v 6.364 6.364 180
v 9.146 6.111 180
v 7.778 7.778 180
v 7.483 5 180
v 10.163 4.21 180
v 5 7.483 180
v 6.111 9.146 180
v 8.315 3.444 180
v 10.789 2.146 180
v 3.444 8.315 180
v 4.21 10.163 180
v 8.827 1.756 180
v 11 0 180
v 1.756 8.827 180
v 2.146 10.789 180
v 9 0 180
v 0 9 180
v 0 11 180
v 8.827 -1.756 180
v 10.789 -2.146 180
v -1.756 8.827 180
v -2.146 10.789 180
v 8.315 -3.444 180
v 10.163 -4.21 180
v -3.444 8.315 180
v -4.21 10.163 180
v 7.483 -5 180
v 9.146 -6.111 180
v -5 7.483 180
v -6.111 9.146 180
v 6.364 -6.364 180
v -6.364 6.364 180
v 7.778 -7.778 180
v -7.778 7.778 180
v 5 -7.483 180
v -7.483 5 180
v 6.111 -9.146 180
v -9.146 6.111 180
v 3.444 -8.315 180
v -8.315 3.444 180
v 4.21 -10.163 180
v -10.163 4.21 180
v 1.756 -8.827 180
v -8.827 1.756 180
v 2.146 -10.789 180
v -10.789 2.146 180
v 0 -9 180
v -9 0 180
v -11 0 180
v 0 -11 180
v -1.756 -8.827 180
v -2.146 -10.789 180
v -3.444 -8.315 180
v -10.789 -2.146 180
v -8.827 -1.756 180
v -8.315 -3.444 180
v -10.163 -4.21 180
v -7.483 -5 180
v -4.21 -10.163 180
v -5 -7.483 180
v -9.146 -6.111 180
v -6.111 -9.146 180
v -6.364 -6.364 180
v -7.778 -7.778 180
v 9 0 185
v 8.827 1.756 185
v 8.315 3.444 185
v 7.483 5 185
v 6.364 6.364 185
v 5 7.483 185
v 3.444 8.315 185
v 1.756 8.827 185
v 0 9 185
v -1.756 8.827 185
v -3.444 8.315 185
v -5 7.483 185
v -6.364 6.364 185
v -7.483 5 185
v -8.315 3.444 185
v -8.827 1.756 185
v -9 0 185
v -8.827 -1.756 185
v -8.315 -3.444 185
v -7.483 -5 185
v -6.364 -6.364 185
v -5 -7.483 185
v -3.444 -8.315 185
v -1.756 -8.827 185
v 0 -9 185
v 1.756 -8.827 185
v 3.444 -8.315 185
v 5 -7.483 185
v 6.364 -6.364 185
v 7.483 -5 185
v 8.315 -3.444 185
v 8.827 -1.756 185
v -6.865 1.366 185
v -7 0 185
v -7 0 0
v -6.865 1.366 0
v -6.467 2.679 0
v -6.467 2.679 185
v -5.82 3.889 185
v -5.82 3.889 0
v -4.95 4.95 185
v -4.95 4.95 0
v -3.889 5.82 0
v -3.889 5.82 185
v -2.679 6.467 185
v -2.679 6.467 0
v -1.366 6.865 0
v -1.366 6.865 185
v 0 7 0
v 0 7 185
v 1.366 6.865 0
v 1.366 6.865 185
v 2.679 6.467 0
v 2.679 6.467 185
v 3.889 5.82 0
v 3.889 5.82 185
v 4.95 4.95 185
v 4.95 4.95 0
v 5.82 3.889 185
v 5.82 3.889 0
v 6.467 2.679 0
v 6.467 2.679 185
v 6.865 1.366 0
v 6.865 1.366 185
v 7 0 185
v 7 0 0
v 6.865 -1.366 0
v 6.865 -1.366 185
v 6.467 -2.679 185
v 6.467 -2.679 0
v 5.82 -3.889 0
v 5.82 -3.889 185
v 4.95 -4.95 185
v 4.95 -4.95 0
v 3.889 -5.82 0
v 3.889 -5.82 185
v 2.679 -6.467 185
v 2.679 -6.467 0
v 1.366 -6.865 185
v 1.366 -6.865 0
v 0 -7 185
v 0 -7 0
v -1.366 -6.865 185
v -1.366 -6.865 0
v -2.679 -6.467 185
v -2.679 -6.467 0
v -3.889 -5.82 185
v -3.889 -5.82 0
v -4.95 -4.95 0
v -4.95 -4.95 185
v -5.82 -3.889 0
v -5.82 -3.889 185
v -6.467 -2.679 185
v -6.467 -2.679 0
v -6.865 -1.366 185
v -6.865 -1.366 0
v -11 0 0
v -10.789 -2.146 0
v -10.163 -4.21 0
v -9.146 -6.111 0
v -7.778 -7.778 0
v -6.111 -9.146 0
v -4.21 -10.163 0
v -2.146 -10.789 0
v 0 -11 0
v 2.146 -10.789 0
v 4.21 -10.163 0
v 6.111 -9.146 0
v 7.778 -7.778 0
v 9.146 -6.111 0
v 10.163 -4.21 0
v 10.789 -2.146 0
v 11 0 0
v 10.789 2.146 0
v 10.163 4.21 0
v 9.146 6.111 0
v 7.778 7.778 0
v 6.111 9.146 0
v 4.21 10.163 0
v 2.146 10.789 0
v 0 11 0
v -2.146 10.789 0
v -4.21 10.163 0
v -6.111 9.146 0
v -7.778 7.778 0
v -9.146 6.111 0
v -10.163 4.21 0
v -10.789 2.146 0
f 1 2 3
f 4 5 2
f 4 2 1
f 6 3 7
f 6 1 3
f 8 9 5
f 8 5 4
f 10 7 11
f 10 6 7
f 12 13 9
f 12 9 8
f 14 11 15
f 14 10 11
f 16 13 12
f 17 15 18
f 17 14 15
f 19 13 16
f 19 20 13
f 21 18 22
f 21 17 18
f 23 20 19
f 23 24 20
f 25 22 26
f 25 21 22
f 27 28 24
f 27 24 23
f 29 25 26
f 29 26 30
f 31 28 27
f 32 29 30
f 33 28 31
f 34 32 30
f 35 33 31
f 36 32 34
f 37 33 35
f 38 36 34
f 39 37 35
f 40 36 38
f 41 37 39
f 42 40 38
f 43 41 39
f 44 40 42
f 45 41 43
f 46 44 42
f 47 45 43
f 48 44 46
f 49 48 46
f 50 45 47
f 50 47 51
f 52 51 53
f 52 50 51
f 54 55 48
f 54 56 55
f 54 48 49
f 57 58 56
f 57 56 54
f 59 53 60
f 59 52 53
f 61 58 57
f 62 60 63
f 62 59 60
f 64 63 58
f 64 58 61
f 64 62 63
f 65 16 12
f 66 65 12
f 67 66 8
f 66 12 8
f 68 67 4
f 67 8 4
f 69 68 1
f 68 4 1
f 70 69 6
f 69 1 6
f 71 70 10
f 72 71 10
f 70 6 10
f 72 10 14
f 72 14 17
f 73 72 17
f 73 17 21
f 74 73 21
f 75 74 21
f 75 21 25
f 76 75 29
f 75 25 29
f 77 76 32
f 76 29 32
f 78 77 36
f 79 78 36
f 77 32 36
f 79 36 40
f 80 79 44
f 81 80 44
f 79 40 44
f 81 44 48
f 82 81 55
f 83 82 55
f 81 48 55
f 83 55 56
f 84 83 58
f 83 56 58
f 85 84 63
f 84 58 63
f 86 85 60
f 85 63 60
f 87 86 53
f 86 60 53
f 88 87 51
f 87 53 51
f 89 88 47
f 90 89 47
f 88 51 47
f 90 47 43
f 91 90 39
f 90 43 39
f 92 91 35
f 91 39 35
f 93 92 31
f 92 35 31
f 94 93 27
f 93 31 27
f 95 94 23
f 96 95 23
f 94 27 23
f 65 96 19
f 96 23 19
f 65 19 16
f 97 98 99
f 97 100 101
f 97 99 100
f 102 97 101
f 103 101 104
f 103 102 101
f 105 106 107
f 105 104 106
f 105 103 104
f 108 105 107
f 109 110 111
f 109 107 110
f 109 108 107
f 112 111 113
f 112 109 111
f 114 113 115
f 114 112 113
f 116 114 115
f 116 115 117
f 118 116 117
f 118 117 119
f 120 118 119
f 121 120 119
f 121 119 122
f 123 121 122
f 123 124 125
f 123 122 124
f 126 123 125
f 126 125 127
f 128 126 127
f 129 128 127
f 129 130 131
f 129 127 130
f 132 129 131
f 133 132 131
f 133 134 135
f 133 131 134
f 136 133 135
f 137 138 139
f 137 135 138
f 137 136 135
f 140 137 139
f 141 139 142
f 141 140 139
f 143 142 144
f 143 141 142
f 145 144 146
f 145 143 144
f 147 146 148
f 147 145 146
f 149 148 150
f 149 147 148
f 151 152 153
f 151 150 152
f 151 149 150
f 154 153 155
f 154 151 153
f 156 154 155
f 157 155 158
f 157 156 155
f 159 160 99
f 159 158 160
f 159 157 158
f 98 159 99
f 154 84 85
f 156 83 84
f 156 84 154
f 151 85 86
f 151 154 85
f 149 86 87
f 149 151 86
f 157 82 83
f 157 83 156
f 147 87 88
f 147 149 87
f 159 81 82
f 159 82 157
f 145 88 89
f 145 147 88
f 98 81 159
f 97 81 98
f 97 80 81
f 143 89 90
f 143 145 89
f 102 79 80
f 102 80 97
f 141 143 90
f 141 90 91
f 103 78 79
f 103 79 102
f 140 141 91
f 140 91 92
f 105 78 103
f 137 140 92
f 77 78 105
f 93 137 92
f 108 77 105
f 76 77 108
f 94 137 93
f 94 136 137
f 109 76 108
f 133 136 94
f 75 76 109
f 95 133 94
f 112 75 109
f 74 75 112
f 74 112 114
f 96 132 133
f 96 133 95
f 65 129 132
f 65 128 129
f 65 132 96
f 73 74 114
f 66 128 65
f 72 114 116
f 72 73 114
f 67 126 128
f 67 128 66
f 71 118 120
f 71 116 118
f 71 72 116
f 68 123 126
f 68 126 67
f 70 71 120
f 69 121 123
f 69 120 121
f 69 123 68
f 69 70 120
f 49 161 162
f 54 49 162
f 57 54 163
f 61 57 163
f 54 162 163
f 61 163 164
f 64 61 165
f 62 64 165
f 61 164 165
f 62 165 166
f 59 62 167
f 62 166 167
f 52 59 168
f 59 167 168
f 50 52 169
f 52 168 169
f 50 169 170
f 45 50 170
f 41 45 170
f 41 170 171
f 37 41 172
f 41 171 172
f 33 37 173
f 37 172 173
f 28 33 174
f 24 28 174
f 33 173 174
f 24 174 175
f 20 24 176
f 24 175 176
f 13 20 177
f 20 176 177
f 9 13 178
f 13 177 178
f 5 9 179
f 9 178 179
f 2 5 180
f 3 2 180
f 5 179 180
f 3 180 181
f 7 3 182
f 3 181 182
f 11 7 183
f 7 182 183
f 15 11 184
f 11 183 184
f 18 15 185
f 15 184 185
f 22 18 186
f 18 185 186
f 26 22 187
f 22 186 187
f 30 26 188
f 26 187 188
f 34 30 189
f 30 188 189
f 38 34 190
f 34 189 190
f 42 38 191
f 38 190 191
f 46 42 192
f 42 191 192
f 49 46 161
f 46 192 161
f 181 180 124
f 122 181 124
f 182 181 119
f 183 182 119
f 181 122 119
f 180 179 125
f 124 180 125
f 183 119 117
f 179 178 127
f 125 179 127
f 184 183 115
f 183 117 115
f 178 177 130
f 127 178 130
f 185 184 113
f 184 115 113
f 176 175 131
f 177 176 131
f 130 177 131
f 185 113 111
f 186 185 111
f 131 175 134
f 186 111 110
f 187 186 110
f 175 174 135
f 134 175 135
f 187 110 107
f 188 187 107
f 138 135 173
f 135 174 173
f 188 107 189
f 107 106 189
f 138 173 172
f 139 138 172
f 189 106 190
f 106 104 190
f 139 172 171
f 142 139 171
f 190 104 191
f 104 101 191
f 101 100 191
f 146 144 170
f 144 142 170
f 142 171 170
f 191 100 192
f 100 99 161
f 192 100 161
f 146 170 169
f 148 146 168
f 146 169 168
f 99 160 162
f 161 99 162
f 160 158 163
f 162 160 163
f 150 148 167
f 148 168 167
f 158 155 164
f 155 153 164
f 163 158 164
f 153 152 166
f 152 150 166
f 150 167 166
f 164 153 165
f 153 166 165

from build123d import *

# Parameters (mm, degrees)
SKETCH_1_R               = 11
EXTRUDE_1_DEPTH          = 180
SKETCH_2_R               = 9
EXTRUDE_2_DEPTH          = 5
CUT_EXTRUDE_1_DEPTH      = 186.652901943
CUT_EXTRUDE_1_DEPTH_BACK = 186.652901943
SKETCH_3_R               = 7


with BuildPart() as part:
    # 草图1 → 凸台-拉伸1 (new body)
    with BuildSketch(Plane.XY):
        with Locations(Location((0, 0, 0), (0, 0, 180))):
            Circle(SKETCH_1_R)
    extrude(amount=EXTRUDE_1_DEPTH)

    # 草图2 → 凸台-拉伸2 (add)
    with BuildSketch(Plane.XY.offset(180)):
        Circle(SKETCH_2_R)
    extrude(amount=EXTRUDE_2_DEPTH)

    # 草图3 → 切除-拉伸1 (cut, two sides: drawn at the far end of the back side and taken through both)
    with BuildSketch(Plane(origin=(0, 0, 0), x_dir=(-1, 0, 0), z_dir=(0, 0, -1)).offset(-CUT_EXTRUDE_1_DEPTH_BACK)):
        Circle(SKETCH_3_R)
    extrude(amount=CUT_EXTRUDE_1_DEPTH + CUT_EXTRUDE_1_DEPTH_BACK, mode=Mode.SUBTRACT)


solid = part.part
